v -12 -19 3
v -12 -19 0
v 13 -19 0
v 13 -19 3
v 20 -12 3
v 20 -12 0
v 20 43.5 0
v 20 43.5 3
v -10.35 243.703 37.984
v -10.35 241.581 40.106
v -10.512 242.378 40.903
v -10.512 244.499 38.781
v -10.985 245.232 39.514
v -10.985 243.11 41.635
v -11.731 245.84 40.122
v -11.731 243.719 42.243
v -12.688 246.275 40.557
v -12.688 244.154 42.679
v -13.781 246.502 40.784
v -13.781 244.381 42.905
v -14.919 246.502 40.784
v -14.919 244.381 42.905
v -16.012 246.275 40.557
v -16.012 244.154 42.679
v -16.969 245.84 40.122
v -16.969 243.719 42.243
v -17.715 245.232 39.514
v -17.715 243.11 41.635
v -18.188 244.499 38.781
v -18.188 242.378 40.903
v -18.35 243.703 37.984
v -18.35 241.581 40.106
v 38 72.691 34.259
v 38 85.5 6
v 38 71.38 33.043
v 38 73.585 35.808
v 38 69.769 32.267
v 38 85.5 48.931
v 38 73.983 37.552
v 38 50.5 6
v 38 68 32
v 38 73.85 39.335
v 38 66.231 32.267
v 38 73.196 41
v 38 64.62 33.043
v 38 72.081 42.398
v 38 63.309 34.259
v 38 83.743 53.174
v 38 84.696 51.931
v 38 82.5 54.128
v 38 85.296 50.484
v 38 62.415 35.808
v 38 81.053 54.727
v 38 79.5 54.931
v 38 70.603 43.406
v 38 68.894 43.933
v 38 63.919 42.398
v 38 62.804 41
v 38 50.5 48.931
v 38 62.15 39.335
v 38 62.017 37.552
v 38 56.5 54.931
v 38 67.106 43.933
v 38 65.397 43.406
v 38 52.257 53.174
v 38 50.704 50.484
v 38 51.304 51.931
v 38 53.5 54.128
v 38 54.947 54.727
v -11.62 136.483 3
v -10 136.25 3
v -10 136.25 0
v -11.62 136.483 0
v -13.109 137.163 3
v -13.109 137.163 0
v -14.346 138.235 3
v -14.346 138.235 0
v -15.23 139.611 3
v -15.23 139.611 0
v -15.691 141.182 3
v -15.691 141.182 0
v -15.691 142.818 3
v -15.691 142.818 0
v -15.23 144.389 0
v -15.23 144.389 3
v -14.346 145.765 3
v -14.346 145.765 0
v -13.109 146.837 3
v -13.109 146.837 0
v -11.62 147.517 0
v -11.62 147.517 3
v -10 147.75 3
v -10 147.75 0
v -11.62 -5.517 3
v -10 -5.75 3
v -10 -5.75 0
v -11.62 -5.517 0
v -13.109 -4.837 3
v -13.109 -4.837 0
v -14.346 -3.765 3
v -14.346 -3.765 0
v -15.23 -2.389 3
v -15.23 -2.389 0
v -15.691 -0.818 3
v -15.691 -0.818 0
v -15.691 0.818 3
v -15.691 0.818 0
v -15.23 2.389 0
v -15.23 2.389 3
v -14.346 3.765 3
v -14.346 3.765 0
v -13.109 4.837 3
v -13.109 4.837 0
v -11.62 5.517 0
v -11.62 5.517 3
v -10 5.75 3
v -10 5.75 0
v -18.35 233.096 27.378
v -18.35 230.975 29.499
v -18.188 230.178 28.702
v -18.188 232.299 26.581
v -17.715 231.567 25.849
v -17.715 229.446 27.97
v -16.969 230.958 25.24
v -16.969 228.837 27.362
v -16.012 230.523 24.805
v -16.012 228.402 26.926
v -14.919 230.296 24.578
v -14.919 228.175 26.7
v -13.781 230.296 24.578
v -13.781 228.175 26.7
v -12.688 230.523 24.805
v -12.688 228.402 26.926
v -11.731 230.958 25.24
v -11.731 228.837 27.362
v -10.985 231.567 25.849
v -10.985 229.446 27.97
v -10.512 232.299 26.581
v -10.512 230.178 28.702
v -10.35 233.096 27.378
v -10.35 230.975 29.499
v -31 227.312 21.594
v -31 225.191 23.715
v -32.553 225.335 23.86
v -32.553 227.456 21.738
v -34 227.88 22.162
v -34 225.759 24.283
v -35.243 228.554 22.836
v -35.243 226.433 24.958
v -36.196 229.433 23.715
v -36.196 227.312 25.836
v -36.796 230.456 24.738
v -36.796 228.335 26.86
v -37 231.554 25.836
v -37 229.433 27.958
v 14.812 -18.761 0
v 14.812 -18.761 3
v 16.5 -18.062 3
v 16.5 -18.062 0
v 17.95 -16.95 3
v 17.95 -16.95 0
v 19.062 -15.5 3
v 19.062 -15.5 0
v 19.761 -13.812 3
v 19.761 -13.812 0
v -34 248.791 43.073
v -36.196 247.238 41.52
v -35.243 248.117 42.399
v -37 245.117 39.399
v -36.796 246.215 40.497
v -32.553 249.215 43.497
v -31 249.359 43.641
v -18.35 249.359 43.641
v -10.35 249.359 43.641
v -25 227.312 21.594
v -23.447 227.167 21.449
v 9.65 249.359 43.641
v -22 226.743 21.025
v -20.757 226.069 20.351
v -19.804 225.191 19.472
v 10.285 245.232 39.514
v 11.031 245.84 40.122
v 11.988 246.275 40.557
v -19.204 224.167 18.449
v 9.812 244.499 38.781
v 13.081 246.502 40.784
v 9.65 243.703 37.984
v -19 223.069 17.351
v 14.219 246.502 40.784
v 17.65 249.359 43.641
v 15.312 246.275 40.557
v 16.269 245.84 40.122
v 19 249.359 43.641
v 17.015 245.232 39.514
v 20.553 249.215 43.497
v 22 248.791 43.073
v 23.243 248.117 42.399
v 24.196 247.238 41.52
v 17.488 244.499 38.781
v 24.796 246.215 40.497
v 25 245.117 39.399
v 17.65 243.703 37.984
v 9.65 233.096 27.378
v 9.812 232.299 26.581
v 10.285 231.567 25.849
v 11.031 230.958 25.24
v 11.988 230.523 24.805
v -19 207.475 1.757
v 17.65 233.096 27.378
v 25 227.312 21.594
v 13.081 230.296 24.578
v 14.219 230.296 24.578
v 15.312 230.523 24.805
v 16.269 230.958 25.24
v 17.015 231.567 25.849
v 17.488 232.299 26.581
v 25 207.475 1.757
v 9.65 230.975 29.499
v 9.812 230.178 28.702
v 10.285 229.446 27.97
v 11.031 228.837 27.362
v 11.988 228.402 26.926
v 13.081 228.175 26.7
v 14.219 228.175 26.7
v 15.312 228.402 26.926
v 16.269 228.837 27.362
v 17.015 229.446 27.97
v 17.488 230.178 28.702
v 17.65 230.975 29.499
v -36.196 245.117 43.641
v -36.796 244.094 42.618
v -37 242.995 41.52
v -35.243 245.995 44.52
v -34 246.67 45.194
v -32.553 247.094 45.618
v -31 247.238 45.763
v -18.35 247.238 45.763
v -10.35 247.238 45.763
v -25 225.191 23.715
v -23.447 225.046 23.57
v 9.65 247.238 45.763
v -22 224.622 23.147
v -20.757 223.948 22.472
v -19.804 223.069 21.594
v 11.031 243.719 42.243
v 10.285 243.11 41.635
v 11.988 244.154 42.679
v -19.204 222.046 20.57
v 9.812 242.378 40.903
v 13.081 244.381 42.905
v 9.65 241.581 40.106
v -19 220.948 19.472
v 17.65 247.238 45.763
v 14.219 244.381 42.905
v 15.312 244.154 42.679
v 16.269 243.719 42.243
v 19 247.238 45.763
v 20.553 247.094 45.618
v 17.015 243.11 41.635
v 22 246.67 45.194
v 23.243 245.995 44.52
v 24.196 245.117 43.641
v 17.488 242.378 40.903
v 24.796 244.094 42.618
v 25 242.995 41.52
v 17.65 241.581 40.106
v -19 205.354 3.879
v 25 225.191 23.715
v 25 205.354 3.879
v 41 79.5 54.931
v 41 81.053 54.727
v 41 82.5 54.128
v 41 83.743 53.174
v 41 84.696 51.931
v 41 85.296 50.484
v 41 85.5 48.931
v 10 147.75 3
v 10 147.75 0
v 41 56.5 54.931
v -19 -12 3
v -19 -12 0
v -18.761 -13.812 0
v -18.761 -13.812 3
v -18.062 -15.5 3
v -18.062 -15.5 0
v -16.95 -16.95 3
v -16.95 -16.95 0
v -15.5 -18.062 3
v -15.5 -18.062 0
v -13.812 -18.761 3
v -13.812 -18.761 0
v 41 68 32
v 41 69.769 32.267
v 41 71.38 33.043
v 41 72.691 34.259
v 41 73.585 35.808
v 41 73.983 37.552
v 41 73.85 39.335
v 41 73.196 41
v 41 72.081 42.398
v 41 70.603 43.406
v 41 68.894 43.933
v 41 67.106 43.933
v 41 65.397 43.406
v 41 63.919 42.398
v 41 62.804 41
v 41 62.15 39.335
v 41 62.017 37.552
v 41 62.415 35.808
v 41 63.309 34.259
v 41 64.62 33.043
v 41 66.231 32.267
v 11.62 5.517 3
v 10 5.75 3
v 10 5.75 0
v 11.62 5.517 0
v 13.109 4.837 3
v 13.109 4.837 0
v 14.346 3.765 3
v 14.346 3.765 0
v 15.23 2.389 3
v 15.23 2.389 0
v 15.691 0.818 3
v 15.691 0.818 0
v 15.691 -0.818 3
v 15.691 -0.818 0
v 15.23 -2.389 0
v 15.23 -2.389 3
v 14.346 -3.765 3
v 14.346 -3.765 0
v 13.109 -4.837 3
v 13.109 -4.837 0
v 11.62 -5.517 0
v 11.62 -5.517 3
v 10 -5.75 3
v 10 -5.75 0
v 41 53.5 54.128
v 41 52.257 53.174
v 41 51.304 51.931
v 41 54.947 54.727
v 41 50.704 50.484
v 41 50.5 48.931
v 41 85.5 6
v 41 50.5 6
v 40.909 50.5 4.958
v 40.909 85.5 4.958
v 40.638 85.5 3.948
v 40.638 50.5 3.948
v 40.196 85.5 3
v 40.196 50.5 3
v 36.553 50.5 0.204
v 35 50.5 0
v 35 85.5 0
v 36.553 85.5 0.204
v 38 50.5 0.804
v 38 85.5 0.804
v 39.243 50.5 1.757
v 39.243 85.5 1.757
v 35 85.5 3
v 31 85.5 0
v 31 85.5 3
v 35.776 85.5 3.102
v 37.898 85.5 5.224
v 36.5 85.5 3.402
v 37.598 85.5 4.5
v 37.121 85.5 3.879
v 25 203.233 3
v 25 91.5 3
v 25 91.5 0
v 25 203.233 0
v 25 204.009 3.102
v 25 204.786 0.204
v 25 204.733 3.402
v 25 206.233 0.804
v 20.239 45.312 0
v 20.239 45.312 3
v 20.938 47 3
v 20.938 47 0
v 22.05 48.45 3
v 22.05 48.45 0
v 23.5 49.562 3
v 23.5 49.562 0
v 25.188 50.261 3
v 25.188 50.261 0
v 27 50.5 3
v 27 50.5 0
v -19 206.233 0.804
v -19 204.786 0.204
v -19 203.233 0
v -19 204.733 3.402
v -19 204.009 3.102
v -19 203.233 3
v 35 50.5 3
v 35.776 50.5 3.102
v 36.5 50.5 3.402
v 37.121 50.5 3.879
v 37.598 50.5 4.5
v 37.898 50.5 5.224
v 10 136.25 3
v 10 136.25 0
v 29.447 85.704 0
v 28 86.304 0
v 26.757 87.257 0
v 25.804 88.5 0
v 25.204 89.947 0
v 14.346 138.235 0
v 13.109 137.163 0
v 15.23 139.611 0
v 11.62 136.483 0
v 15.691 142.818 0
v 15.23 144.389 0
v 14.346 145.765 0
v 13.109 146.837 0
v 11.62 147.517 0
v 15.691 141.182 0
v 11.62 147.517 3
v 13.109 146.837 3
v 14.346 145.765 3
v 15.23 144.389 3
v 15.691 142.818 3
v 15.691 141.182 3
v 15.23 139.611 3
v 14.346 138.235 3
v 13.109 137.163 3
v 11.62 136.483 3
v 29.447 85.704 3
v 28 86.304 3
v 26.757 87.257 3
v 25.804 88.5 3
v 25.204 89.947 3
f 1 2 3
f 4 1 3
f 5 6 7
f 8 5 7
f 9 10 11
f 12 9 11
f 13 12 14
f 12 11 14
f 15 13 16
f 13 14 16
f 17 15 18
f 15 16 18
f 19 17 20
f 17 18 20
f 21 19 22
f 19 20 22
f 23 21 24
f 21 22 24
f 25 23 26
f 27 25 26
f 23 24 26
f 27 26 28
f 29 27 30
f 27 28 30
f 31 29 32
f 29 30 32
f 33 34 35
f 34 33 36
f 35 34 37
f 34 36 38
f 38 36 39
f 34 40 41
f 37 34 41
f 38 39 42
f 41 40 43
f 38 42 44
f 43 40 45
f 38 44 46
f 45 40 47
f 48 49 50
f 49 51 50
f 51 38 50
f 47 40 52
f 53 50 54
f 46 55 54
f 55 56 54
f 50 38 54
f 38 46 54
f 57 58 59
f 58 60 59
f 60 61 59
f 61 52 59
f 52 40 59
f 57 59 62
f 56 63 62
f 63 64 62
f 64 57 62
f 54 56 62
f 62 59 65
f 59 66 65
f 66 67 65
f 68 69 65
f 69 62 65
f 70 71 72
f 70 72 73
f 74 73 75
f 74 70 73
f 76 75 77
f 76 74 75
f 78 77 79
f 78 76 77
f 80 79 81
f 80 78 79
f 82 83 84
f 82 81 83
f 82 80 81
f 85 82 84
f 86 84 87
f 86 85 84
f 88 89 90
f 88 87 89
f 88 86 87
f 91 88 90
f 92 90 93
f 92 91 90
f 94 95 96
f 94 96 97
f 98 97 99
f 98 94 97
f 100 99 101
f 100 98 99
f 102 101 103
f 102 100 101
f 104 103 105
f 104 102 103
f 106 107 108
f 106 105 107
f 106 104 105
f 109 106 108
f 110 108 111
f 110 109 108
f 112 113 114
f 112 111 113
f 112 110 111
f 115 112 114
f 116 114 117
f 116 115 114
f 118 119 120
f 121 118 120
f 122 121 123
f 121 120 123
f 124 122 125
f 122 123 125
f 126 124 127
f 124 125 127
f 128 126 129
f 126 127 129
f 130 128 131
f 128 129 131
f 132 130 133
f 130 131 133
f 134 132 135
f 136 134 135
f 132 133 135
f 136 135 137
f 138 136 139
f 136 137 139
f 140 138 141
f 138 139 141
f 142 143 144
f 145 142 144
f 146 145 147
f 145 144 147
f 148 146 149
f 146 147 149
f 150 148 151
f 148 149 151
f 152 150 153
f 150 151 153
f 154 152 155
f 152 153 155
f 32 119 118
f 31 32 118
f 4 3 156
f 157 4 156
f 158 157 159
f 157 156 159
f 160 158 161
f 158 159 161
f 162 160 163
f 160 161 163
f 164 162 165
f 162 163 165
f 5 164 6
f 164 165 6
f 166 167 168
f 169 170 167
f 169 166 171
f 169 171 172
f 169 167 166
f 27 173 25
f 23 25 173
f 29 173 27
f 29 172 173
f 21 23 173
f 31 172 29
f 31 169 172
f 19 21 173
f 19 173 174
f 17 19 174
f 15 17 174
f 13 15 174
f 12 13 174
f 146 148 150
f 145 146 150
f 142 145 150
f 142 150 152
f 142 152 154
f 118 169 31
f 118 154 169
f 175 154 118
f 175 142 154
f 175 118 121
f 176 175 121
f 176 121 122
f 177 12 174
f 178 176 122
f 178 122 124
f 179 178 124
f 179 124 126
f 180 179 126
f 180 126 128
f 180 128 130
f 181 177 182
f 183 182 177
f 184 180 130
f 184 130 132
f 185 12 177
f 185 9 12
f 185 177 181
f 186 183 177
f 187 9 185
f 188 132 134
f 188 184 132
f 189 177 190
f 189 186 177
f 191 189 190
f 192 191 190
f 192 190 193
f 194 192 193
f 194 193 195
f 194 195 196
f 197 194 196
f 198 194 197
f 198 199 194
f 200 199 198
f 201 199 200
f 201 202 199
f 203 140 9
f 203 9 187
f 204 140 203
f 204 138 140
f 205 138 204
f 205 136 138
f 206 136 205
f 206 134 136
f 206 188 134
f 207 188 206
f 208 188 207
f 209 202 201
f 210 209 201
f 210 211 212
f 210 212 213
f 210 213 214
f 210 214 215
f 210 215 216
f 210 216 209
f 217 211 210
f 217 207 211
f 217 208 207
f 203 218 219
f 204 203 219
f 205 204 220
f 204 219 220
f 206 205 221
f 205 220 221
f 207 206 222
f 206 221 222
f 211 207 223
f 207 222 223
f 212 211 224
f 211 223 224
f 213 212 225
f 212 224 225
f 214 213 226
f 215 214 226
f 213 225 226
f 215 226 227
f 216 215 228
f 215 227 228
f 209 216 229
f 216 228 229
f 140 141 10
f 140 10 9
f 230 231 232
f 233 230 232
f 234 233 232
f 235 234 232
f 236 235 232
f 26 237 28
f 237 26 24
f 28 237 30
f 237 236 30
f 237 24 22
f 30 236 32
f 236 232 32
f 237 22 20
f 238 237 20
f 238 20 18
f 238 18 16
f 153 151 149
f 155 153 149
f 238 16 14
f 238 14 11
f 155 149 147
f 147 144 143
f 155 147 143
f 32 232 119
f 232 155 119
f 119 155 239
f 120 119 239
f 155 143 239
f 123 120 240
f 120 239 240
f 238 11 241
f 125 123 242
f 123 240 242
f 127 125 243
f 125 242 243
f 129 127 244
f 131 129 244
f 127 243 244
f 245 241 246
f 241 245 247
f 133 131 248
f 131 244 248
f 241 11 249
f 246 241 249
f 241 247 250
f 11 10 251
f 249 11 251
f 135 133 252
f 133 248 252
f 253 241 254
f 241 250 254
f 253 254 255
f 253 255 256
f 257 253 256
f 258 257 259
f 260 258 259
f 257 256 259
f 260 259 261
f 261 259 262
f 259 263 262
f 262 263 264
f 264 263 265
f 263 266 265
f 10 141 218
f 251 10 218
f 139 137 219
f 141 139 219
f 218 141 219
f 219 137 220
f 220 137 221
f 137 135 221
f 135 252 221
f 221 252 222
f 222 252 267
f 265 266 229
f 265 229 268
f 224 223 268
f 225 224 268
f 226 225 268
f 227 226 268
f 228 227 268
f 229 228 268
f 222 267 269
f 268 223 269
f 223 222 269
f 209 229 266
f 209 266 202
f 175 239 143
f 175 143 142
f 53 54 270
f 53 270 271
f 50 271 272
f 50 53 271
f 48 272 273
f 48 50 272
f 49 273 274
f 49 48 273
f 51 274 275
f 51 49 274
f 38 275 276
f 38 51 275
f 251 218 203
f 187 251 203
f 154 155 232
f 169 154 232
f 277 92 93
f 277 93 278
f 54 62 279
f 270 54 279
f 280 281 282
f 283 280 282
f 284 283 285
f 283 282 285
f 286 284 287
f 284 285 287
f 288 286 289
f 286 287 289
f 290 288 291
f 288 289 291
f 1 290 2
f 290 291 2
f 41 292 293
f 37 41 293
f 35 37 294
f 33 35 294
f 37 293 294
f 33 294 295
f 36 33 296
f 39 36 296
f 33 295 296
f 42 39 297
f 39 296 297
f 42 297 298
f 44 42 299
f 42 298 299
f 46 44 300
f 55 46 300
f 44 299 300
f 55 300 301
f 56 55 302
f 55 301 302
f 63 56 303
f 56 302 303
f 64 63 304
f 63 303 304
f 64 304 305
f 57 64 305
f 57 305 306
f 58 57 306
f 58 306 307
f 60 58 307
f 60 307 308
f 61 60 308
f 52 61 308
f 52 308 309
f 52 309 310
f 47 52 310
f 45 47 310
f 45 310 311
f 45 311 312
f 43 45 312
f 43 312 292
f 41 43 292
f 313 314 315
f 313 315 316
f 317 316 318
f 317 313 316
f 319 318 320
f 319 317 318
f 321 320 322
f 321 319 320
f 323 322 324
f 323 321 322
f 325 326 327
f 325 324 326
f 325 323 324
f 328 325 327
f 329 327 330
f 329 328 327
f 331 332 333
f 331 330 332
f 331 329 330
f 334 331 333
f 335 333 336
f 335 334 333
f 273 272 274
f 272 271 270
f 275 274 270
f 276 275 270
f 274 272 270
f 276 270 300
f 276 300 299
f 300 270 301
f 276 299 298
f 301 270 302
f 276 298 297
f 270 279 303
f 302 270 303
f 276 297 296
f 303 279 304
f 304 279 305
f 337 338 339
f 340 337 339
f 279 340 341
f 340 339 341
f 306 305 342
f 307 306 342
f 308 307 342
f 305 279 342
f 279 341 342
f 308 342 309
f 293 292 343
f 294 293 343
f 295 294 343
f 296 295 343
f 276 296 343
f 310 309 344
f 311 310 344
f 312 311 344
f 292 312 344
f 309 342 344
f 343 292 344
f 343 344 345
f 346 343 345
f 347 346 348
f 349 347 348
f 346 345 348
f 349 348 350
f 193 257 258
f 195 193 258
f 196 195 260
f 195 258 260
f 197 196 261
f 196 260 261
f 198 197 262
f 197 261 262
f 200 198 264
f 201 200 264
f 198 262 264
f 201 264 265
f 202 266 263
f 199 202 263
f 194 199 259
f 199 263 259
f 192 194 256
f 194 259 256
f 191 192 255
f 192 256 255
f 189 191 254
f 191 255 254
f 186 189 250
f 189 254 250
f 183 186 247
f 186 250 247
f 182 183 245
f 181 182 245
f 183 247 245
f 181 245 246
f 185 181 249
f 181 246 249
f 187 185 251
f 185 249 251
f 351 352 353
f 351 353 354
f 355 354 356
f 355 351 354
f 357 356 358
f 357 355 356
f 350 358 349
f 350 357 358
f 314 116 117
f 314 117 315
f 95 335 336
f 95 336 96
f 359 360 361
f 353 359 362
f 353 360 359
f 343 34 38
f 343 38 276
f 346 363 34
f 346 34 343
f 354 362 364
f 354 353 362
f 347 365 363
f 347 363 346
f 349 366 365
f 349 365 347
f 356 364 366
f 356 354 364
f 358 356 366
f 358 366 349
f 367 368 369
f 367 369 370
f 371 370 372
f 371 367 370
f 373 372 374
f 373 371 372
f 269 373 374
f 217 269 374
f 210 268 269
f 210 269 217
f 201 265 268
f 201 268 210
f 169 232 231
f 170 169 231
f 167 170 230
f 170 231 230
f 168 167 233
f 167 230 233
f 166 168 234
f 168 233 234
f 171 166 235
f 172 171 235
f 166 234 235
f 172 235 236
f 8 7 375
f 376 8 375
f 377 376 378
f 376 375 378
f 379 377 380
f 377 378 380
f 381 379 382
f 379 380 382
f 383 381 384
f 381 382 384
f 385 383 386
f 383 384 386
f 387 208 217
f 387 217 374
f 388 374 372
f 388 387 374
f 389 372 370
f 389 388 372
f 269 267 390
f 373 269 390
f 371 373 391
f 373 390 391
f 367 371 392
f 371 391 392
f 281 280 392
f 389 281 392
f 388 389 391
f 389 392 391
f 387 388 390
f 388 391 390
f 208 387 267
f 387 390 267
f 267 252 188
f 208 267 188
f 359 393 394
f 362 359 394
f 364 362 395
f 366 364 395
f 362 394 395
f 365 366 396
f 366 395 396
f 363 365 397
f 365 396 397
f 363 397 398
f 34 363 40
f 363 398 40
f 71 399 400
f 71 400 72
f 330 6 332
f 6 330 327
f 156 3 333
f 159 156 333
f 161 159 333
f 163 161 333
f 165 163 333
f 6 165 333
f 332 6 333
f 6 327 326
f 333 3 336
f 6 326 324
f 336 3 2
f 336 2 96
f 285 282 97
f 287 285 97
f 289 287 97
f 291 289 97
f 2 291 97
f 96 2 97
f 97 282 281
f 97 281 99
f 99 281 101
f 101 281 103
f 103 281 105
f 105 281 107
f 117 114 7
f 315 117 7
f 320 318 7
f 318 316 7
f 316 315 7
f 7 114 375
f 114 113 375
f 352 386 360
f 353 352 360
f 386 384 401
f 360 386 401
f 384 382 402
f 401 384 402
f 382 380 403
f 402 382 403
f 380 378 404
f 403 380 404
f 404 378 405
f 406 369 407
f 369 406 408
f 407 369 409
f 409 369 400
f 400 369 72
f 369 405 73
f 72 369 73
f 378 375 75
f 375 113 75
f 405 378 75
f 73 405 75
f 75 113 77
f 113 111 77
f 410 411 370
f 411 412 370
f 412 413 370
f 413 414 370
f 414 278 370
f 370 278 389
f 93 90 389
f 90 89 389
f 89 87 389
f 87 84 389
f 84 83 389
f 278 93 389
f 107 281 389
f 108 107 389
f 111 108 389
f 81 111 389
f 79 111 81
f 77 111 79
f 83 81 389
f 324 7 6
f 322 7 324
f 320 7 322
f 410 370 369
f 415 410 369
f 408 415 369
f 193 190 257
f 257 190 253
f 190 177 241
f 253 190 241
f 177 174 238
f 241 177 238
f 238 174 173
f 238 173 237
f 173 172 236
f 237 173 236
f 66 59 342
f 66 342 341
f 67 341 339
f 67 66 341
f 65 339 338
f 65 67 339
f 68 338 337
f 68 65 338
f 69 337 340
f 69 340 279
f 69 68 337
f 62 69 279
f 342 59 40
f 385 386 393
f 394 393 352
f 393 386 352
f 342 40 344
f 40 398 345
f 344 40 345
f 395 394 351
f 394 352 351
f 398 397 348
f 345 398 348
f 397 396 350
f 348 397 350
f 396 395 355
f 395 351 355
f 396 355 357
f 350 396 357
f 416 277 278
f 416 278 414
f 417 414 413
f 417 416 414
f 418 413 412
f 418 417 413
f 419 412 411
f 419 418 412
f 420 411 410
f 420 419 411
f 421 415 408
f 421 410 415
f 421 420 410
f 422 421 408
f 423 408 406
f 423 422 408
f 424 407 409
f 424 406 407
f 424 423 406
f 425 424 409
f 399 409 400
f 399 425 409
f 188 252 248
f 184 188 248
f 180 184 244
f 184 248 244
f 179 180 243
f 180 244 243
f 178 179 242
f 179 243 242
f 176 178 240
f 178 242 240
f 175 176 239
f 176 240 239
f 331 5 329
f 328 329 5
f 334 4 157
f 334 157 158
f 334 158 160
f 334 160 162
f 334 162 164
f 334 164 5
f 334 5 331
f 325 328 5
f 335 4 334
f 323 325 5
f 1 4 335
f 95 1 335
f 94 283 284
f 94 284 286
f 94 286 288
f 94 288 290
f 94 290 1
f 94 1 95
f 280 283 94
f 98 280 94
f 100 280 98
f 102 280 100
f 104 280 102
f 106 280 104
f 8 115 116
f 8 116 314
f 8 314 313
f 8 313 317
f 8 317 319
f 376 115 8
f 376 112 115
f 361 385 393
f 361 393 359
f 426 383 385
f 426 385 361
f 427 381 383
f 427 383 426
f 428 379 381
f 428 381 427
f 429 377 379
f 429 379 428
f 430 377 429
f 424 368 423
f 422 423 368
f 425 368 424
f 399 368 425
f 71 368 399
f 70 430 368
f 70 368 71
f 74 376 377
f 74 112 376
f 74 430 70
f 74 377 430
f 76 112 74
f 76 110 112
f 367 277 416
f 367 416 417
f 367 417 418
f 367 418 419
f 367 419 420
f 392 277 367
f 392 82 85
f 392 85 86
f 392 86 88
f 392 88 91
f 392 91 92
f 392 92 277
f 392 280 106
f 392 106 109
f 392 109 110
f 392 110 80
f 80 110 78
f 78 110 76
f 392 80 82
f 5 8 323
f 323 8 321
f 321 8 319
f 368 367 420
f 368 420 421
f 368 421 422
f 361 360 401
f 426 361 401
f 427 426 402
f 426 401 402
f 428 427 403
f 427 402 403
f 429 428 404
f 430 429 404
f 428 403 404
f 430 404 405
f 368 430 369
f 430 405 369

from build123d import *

# Parameters (mm, degrees)
BASE_FLANGE1_DEPTH     = 3
CUT_EXTRUDE1_DEPTH     = 10
SKETCHED_START         = 179.903820644
SKETCHED_BEND1_DEPTH   = 9.096179356
SKETCHED_START_2       = -37
SKETCHED_BEND1_2_DEPTH = 62
SKETCHED_START_3       = -19
SKETCHED_BEND1_3_DEPTH = 44
SKETCHED_START_4       = -10.35
SKETCHED_BEND1_4_DEPTH = 20
SKETCHED_START_5       = -31
SKETCHED_BEND1_5_DEPTH = 12.65
SKETCHED_START_6       = 17.65
SKETCHED_BEND1_6_DEPTH = 1.35
SKETCHED_START_7       = 142.46468863
SKETCHED_BEND1_7_DEPTH = 2.999999999
SKETCHED_START_8       = 50.5
SKETCHED_BEND2_DEPTH   = 35
SKETCHED_BEND2_2_DEPTH = 35
SKETCHED_START_9       = 31
SKETCHED_BEND2_3_DEPTH = 11
SKETCH9_R              = 6
CUT_EXTRUDE2_DEPTH     = 10
CUT_EXTRUDE3_DEPTH     = 10


with BuildPart() as part:
    # Base-Flange1: sheet metal written as solids
    # Sketch1 → Base-Flange1 (new body)
    with BuildSketch(Plane(origin=(0, 0, 0), x_dir=(0, 1, 0), z_dir=(0, 0, 1))):
        with BuildLine():
            Line((-19, 12), (-19, -13))
            ThreePointArc((-19, -13), (-16.949747468, -17.949747468), (-12, -20))
            Line((-12, -20), (43.5, -20))
            ThreePointArc((43.5, -20), (48.449747468, -22.050252532), (50.5, -27))
            Line((50.5, -27), (50.5, -85))
            ThreePointArc((50.5, -85), (52.257359313, -89.242640687), (56.5, -91))
            Line((56.5, -91), (79.5, -91))
            ThreePointArc((79.5, -91), (83.742640687, -89.242640687), (85.5, -85))
            Line((85.5, -85), (85.5, -31))
            ThreePointArc((85.5, -31), (87.257359313, -26.757359313), (91.5, -25))
            Line((91.5, -25), (260, -25))
            ThreePointArc((260, -25), (264.242640687, -23.242640687), (266, -19))
            Line((266, -19), (266, 31))
            ThreePointArc((266, 31), (264.242640687, 35.242640687), (260, 37))
            Line((260, 37), (240.82, 37))
            ThreePointArc((240.82, 37), (236.577359313, 35.242640687), (234.82, 31))
            Line((234.82, 31), (234.82, 25))
            ThreePointArc((234.82, 25), (233.062640687, 20.757359313), (228.82, 19))
            Line((228.82, 19), (-12, 19))
            ThreePointArc((-12, 19), (-16.949747468, 16.949747468), (-19, 12))
        make_face()
    extrude(amount=BASE_FLANGE1_DEPTH)

    # Sketch6 → Cut-Extrude1 (cut)
    with BuildSketch(Plane.XY.offset(3)):
        with BuildLine():
            Line((9.65, 243), (9.65, 258))
            ThreePointArc((9.65, 258), (13.65, 262), (17.65, 258))
            Line((17.65, 258), (17.65, 243))
            ThreePointArc((17.65, 243), (13.65, 239), (9.65, 243))
        make_face()
        with BuildLine():
            Line((-18.35, 243), (-18.35, 258))
            ThreePointArc((-18.35, 258), (-14.35, 262), (-10.35, 258))
            Line((-10.35, 258), (-10.35, 243))
            ThreePointArc((-10.35, 243), (-14.35, 239), (-18.35, 243))
        make_face()
    extrude(amount=-CUT_EXTRUDE1_DEPTH, mode=Mode.SUBTRACT)

    # Sketched Bend1: read off the stored shape, not the designer's step
    # Sketched Bend1 outline → Sketched Bend1 (cut)
    with BuildSketch(Plane(origin=(0, 0, 0), x_dir=(1, 0, 0), z_dir=(0, 0.707106781186549, -0.707106781186546)).offset(SKETCHED_START)):
        with BuildLine():
            Line((9.65, -184.182824136), (9.65, -199.182824136))
            ThreePointArc((9.65, -199.182824136), (13.65, -203.182824136), (17.65, -199.182824136))
            Line((17.65, -199.182824136), (17.65, -184.182824136))
            ThreePointArc((17.65, -184.182824136), (13.65, -180.182824136), (9.65, -184.182824136))
        make_face()
        with BuildLine():
            Line((-18.35, -184.182824136), (-18.35, -199.182824136))
            ThreePointArc((-18.35, -199.182824136), (-14.35, -203.182824136), (-10.35, -199.182824136))
            Line((-10.35, -199.182824136), (-10.35, -184.182824136))
            ThreePointArc((-10.35, -184.182824136), (-14.35, -180.182824136), (-18.35, -184.182824136))
        make_face()
    extrude(amount=SKETCHED_BEND1_DEPTH, mode=Mode.SUBTRACT)

    # Sketched Bend1 2 outline → Sketched Bend1 2 (cut)
    with BuildSketch(Plane.YZ.offset(SKETCHED_START_2)):
        with BuildLine():
            Line((208.718135506, 3), (207.475494819, 1.757359313))
            ThreePointArc((207.475494819, 1.757359313), (205.528954726, 0.456722805), (203.232854132, 0))
            Line((203.232854132, 0), (266, 0))
            Line((266, 0), (266, 3))
            Line((266, 3), (208.718135506, 3))
        make_face()
    extrude(amount=SKETCHED_BEND1_2_DEPTH, mode=Mode.SUBTRACT)

    # Sketched Bend1 3 outline → Sketched Bend1 3 (add)
    with BuildSketch(Plane.YZ.offset(SKETCHED_START_3)):
        with BuildLine():
            Line((225.190537865, 23.715043045), (205.354174476, 3.878679656))
            ThreePointArc((205.354174476, 3.878679656), (204.380904429, 3.228361402), (203.232854132, 3))
            Line((203.232854132, 3), (208.718135506, 3))
            Line((208.718135506, 3), (227.311858208, 21.593722702))
            Line((227.311858208, 21.593722702), (225.190537865, 23.715043045))
        make_face()
    extrude(amount=SKETCHED_BEND1_3_DEPTH)

    # Sketched Bend1 4 outline → Sketched Bend1 4 (add)
    with BuildSketch(Plane.YZ.offset(SKETCHED_START_4)):
        Polygon((247.238127302, 45.762632482), (225.190537865, 23.715043045), (227.311858208, 21.593722702), (249.359447645, 43.641312139), align=None)
    extrude(amount=SKETCHED_BEND1_4_DEPTH)

    # Sketched Bend1 5 outline → Sketched Bend1 5 (add)
    with BuildSketch(Plane.YZ.offset(SKETCHED_START_5)):
        Polygon((247.238127302, 45.762632482), (225.190537865, 23.715043045), (227.311858208, 21.593722702), (249.359447645, 43.641312139), align=None)
    extrude(amount=SKETCHED_BEND1_5_DEPTH)

    # Sketched Bend1 6 outline → Sketched Bend1 6 (add)
    with BuildSketch(Plane.YZ.offset(SKETCHED_START_6)):
        Polygon((247.238127302, 45.762632482), (225.190537865, 23.715043045), (227.311858208, 21.593722702), (249.359447645, 43.641312139), align=None)
    extrude(amount=SKETCHED_BEND1_6_DEPTH)

    # Sketched Bend1 7 outline → Sketched Bend1 7 (add)
    with BuildSketch(Plane(origin=(0, 0, 0), x_dir=(1, 0, 0), z_dir=(0, 0.707106781186549, -0.707106781186546)).offset(SKETCHED_START_7)):
        with BuildLine():
            ThreePointArc((-19, -170.002824136), (-20.757359313, -174.245464823), (-25, -176.002824136))
            Line((-25, -176.002824136), (-19, -176.002824137))
            Line((-19, -176.002824137), (-19, -170.002824136))
        make_face()
        with BuildLine():
            ThreePointArc((-37, -201.182824136), (-35.242640687, -205.425464823), (-31, -207.182824136))
            Line((-31, -207.182824136), (-31, -176.002824136))
            ThreePointArc((-31, -176.002824136), (-35.242640687, -177.760183449), (-37, -182.002824136))
            Line((-37, -182.002824136), (-37, -201.182824136))
        make_face()
        with BuildLine():
            Line((-18.35, -207.182824136), (-10.35, -207.182824136))
            Line((-10.35, -207.182824136), (-10.35, -199.182824136))
            ThreePointArc((-10.35, -199.182824136), (-14.35, -203.182824136), (-18.35, -199.182824136))
            Line((-18.35, -199.182824136), (-18.35, -207.182824136))
        make_face()
        with BuildLine():
            Line((9.65, -207.182824136), (17.65, -207.182824136))
            Line((17.65, -207.182824136), (17.65, -199.182824136))
            ThreePointArc((17.65, -199.182824136), (13.65, -203.182824136), (9.65, -199.182824136))
            Line((9.65, -199.182824136), (9.65, -207.182824136))
        make_face()
        with BuildLine():
            Line((25, -201.182824136), (25, -176.002824137))
            Line((25, -176.002824137), (19, -176.002824137))
            Line((19, -176.002824137), (19, -207.182824136))
            ThreePointArc((19, -207.182824136), (23.242640687, -205.425464823), (25, -201.182824136))
        make_face()
        with BuildLine():
            ThreePointArc((9.65, -184.182824136), (13.65, -180.182824136), (17.65, -184.182824136))
            Line((17.65, -184.182824136), (17.65, -176.002824137))
            Line((17.65, -176.002824137), (9.65, -176.002824137))
            Line((9.65, -176.002824137), (9.65, -184.182824136))
        make_face()
        with BuildLine():
            ThreePointArc((-18.35, -184.182824136), (-14.35, -180.182824136), (-10.35, -184.182824136))
            Line((-10.35, -184.182824136), (-10.35, -176.002824137))
            Line((-10.35, -176.002824137), (-18.35, -176.002824137))
            Line((-18.35, -176.002824137), (-18.35, -184.182824136))
        make_face()
    extrude(amount=SKETCHED_BEND1_7_DEPTH)

    # Sketched Bend2: read off the stored shape, not the designer's step
    # Sketched Bend2 outline → Sketched Bend2 (cut)
    with BuildSketch(Plane(origin=(0, 0, 0), x_dir=(1, 0, 0), z_dir=(0, 1, 0)).offset(SKETCHED_START_8)):
        with BuildLine():
            ThreePointArc((35, 0), (38, -0.803847577), (40.196152423, -3))
            Line((40.196152423, -3), (91, -3))
            Line((91, -3), (91, 0))
            Line((91, 0), (35, 0))
        make_face()
    extrude(amount=SKETCHED_BEND2_DEPTH, mode=Mode.SUBTRACT)

    # Sketched Bend2 2 outline → Sketched Bend2 2 (add)
    with BuildSketch(Plane(origin=(0, 0, 0), x_dir=(1, 0, 0), z_dir=(0, 1, 0)).offset(SKETCHED_START_8)):
        with BuildLine():
            ThreePointArc((35, -3), (37.121320344, -3.878679656), (38, -6))
            Line((38, -6), (38, -54.931416529))
            Line((38, -54.931416529), (41, -54.931416529))
            Line((41, -54.931416529), (41, -6))
            ThreePointArc((41, -6), (40.795554958, -4.447085729), (40.196152423, -3))
            Line((40.196152423, -3), (35, -3))
        make_face()
    extrude(amount=SKETCHED_BEND2_2_DEPTH)

    # Sketched Bend2 3 outline → Sketched Bend2 3 (cut)
    with BuildSketch(Plane.YZ.offset(SKETCHED_START_9)):
        with BuildLine():
            ThreePointArc((50.5, 48.931416529), (52.257359313, 53.174057216), (56.5, 54.931416529))
            Line((56.5, 54.931416529), (50.5, 54.931416529))
            Line((50.5, 54.931416529), (50.5, 48.931416529))
        make_face()
        with BuildLine():
            ThreePointArc((79.5, 54.931416529), (83.742640687, 53.174057217), (85.5, 48.931416529))
            Line((85.5, 48.931416529), (85.5, 54.931416529))
            Line((85.5, 54.931416529), (79.5, 54.931416529))
        make_face()
    extrude(amount=SKETCHED_BEND2_3_DEPTH, mode=Mode.SUBTRACT)

    # Sketch9 → Cut-Extrude2 (cut)
    with BuildSketch(Plane.YZ.offset(41)):
        with Locations(Location((68, 38, 0), (0, 0, 270))):
            Circle(SKETCH9_R)
    extrude(amount=-CUT_EXTRUDE2_DEPTH, mode=Mode.SUBTRACT)

    # Sketch10 → Cut-Extrude3 (cut)
    with BuildSketch(Plane.XY.offset(3)):
        with BuildLine():
            Line((-10, 5.75), (10, 5.75))
            ThreePointArc((10, 5.75), (15.75, 0), (10, -5.75))
            Line((10, -5.75), (-10, -5.75))
            ThreePointArc((-10, -5.75), (-15.75, 0), (-10, 5.75))
        make_face()
        with BuildLine():
            Line((-10, 147.75), (10, 147.75))
            ThreePointArc((10, 147.75), (15.75, 142), (10, 136.25))
            Line((10, 136.25), (-10, 136.25))
            ThreePointArc((-10, 136.25), (-15.75, 142), (-10, 147.75))
        make_face()
    extrude(amount=-CUT_EXTRUDE3_DEPTH, mode=Mode.SUBTRACT)


solid = part.part
